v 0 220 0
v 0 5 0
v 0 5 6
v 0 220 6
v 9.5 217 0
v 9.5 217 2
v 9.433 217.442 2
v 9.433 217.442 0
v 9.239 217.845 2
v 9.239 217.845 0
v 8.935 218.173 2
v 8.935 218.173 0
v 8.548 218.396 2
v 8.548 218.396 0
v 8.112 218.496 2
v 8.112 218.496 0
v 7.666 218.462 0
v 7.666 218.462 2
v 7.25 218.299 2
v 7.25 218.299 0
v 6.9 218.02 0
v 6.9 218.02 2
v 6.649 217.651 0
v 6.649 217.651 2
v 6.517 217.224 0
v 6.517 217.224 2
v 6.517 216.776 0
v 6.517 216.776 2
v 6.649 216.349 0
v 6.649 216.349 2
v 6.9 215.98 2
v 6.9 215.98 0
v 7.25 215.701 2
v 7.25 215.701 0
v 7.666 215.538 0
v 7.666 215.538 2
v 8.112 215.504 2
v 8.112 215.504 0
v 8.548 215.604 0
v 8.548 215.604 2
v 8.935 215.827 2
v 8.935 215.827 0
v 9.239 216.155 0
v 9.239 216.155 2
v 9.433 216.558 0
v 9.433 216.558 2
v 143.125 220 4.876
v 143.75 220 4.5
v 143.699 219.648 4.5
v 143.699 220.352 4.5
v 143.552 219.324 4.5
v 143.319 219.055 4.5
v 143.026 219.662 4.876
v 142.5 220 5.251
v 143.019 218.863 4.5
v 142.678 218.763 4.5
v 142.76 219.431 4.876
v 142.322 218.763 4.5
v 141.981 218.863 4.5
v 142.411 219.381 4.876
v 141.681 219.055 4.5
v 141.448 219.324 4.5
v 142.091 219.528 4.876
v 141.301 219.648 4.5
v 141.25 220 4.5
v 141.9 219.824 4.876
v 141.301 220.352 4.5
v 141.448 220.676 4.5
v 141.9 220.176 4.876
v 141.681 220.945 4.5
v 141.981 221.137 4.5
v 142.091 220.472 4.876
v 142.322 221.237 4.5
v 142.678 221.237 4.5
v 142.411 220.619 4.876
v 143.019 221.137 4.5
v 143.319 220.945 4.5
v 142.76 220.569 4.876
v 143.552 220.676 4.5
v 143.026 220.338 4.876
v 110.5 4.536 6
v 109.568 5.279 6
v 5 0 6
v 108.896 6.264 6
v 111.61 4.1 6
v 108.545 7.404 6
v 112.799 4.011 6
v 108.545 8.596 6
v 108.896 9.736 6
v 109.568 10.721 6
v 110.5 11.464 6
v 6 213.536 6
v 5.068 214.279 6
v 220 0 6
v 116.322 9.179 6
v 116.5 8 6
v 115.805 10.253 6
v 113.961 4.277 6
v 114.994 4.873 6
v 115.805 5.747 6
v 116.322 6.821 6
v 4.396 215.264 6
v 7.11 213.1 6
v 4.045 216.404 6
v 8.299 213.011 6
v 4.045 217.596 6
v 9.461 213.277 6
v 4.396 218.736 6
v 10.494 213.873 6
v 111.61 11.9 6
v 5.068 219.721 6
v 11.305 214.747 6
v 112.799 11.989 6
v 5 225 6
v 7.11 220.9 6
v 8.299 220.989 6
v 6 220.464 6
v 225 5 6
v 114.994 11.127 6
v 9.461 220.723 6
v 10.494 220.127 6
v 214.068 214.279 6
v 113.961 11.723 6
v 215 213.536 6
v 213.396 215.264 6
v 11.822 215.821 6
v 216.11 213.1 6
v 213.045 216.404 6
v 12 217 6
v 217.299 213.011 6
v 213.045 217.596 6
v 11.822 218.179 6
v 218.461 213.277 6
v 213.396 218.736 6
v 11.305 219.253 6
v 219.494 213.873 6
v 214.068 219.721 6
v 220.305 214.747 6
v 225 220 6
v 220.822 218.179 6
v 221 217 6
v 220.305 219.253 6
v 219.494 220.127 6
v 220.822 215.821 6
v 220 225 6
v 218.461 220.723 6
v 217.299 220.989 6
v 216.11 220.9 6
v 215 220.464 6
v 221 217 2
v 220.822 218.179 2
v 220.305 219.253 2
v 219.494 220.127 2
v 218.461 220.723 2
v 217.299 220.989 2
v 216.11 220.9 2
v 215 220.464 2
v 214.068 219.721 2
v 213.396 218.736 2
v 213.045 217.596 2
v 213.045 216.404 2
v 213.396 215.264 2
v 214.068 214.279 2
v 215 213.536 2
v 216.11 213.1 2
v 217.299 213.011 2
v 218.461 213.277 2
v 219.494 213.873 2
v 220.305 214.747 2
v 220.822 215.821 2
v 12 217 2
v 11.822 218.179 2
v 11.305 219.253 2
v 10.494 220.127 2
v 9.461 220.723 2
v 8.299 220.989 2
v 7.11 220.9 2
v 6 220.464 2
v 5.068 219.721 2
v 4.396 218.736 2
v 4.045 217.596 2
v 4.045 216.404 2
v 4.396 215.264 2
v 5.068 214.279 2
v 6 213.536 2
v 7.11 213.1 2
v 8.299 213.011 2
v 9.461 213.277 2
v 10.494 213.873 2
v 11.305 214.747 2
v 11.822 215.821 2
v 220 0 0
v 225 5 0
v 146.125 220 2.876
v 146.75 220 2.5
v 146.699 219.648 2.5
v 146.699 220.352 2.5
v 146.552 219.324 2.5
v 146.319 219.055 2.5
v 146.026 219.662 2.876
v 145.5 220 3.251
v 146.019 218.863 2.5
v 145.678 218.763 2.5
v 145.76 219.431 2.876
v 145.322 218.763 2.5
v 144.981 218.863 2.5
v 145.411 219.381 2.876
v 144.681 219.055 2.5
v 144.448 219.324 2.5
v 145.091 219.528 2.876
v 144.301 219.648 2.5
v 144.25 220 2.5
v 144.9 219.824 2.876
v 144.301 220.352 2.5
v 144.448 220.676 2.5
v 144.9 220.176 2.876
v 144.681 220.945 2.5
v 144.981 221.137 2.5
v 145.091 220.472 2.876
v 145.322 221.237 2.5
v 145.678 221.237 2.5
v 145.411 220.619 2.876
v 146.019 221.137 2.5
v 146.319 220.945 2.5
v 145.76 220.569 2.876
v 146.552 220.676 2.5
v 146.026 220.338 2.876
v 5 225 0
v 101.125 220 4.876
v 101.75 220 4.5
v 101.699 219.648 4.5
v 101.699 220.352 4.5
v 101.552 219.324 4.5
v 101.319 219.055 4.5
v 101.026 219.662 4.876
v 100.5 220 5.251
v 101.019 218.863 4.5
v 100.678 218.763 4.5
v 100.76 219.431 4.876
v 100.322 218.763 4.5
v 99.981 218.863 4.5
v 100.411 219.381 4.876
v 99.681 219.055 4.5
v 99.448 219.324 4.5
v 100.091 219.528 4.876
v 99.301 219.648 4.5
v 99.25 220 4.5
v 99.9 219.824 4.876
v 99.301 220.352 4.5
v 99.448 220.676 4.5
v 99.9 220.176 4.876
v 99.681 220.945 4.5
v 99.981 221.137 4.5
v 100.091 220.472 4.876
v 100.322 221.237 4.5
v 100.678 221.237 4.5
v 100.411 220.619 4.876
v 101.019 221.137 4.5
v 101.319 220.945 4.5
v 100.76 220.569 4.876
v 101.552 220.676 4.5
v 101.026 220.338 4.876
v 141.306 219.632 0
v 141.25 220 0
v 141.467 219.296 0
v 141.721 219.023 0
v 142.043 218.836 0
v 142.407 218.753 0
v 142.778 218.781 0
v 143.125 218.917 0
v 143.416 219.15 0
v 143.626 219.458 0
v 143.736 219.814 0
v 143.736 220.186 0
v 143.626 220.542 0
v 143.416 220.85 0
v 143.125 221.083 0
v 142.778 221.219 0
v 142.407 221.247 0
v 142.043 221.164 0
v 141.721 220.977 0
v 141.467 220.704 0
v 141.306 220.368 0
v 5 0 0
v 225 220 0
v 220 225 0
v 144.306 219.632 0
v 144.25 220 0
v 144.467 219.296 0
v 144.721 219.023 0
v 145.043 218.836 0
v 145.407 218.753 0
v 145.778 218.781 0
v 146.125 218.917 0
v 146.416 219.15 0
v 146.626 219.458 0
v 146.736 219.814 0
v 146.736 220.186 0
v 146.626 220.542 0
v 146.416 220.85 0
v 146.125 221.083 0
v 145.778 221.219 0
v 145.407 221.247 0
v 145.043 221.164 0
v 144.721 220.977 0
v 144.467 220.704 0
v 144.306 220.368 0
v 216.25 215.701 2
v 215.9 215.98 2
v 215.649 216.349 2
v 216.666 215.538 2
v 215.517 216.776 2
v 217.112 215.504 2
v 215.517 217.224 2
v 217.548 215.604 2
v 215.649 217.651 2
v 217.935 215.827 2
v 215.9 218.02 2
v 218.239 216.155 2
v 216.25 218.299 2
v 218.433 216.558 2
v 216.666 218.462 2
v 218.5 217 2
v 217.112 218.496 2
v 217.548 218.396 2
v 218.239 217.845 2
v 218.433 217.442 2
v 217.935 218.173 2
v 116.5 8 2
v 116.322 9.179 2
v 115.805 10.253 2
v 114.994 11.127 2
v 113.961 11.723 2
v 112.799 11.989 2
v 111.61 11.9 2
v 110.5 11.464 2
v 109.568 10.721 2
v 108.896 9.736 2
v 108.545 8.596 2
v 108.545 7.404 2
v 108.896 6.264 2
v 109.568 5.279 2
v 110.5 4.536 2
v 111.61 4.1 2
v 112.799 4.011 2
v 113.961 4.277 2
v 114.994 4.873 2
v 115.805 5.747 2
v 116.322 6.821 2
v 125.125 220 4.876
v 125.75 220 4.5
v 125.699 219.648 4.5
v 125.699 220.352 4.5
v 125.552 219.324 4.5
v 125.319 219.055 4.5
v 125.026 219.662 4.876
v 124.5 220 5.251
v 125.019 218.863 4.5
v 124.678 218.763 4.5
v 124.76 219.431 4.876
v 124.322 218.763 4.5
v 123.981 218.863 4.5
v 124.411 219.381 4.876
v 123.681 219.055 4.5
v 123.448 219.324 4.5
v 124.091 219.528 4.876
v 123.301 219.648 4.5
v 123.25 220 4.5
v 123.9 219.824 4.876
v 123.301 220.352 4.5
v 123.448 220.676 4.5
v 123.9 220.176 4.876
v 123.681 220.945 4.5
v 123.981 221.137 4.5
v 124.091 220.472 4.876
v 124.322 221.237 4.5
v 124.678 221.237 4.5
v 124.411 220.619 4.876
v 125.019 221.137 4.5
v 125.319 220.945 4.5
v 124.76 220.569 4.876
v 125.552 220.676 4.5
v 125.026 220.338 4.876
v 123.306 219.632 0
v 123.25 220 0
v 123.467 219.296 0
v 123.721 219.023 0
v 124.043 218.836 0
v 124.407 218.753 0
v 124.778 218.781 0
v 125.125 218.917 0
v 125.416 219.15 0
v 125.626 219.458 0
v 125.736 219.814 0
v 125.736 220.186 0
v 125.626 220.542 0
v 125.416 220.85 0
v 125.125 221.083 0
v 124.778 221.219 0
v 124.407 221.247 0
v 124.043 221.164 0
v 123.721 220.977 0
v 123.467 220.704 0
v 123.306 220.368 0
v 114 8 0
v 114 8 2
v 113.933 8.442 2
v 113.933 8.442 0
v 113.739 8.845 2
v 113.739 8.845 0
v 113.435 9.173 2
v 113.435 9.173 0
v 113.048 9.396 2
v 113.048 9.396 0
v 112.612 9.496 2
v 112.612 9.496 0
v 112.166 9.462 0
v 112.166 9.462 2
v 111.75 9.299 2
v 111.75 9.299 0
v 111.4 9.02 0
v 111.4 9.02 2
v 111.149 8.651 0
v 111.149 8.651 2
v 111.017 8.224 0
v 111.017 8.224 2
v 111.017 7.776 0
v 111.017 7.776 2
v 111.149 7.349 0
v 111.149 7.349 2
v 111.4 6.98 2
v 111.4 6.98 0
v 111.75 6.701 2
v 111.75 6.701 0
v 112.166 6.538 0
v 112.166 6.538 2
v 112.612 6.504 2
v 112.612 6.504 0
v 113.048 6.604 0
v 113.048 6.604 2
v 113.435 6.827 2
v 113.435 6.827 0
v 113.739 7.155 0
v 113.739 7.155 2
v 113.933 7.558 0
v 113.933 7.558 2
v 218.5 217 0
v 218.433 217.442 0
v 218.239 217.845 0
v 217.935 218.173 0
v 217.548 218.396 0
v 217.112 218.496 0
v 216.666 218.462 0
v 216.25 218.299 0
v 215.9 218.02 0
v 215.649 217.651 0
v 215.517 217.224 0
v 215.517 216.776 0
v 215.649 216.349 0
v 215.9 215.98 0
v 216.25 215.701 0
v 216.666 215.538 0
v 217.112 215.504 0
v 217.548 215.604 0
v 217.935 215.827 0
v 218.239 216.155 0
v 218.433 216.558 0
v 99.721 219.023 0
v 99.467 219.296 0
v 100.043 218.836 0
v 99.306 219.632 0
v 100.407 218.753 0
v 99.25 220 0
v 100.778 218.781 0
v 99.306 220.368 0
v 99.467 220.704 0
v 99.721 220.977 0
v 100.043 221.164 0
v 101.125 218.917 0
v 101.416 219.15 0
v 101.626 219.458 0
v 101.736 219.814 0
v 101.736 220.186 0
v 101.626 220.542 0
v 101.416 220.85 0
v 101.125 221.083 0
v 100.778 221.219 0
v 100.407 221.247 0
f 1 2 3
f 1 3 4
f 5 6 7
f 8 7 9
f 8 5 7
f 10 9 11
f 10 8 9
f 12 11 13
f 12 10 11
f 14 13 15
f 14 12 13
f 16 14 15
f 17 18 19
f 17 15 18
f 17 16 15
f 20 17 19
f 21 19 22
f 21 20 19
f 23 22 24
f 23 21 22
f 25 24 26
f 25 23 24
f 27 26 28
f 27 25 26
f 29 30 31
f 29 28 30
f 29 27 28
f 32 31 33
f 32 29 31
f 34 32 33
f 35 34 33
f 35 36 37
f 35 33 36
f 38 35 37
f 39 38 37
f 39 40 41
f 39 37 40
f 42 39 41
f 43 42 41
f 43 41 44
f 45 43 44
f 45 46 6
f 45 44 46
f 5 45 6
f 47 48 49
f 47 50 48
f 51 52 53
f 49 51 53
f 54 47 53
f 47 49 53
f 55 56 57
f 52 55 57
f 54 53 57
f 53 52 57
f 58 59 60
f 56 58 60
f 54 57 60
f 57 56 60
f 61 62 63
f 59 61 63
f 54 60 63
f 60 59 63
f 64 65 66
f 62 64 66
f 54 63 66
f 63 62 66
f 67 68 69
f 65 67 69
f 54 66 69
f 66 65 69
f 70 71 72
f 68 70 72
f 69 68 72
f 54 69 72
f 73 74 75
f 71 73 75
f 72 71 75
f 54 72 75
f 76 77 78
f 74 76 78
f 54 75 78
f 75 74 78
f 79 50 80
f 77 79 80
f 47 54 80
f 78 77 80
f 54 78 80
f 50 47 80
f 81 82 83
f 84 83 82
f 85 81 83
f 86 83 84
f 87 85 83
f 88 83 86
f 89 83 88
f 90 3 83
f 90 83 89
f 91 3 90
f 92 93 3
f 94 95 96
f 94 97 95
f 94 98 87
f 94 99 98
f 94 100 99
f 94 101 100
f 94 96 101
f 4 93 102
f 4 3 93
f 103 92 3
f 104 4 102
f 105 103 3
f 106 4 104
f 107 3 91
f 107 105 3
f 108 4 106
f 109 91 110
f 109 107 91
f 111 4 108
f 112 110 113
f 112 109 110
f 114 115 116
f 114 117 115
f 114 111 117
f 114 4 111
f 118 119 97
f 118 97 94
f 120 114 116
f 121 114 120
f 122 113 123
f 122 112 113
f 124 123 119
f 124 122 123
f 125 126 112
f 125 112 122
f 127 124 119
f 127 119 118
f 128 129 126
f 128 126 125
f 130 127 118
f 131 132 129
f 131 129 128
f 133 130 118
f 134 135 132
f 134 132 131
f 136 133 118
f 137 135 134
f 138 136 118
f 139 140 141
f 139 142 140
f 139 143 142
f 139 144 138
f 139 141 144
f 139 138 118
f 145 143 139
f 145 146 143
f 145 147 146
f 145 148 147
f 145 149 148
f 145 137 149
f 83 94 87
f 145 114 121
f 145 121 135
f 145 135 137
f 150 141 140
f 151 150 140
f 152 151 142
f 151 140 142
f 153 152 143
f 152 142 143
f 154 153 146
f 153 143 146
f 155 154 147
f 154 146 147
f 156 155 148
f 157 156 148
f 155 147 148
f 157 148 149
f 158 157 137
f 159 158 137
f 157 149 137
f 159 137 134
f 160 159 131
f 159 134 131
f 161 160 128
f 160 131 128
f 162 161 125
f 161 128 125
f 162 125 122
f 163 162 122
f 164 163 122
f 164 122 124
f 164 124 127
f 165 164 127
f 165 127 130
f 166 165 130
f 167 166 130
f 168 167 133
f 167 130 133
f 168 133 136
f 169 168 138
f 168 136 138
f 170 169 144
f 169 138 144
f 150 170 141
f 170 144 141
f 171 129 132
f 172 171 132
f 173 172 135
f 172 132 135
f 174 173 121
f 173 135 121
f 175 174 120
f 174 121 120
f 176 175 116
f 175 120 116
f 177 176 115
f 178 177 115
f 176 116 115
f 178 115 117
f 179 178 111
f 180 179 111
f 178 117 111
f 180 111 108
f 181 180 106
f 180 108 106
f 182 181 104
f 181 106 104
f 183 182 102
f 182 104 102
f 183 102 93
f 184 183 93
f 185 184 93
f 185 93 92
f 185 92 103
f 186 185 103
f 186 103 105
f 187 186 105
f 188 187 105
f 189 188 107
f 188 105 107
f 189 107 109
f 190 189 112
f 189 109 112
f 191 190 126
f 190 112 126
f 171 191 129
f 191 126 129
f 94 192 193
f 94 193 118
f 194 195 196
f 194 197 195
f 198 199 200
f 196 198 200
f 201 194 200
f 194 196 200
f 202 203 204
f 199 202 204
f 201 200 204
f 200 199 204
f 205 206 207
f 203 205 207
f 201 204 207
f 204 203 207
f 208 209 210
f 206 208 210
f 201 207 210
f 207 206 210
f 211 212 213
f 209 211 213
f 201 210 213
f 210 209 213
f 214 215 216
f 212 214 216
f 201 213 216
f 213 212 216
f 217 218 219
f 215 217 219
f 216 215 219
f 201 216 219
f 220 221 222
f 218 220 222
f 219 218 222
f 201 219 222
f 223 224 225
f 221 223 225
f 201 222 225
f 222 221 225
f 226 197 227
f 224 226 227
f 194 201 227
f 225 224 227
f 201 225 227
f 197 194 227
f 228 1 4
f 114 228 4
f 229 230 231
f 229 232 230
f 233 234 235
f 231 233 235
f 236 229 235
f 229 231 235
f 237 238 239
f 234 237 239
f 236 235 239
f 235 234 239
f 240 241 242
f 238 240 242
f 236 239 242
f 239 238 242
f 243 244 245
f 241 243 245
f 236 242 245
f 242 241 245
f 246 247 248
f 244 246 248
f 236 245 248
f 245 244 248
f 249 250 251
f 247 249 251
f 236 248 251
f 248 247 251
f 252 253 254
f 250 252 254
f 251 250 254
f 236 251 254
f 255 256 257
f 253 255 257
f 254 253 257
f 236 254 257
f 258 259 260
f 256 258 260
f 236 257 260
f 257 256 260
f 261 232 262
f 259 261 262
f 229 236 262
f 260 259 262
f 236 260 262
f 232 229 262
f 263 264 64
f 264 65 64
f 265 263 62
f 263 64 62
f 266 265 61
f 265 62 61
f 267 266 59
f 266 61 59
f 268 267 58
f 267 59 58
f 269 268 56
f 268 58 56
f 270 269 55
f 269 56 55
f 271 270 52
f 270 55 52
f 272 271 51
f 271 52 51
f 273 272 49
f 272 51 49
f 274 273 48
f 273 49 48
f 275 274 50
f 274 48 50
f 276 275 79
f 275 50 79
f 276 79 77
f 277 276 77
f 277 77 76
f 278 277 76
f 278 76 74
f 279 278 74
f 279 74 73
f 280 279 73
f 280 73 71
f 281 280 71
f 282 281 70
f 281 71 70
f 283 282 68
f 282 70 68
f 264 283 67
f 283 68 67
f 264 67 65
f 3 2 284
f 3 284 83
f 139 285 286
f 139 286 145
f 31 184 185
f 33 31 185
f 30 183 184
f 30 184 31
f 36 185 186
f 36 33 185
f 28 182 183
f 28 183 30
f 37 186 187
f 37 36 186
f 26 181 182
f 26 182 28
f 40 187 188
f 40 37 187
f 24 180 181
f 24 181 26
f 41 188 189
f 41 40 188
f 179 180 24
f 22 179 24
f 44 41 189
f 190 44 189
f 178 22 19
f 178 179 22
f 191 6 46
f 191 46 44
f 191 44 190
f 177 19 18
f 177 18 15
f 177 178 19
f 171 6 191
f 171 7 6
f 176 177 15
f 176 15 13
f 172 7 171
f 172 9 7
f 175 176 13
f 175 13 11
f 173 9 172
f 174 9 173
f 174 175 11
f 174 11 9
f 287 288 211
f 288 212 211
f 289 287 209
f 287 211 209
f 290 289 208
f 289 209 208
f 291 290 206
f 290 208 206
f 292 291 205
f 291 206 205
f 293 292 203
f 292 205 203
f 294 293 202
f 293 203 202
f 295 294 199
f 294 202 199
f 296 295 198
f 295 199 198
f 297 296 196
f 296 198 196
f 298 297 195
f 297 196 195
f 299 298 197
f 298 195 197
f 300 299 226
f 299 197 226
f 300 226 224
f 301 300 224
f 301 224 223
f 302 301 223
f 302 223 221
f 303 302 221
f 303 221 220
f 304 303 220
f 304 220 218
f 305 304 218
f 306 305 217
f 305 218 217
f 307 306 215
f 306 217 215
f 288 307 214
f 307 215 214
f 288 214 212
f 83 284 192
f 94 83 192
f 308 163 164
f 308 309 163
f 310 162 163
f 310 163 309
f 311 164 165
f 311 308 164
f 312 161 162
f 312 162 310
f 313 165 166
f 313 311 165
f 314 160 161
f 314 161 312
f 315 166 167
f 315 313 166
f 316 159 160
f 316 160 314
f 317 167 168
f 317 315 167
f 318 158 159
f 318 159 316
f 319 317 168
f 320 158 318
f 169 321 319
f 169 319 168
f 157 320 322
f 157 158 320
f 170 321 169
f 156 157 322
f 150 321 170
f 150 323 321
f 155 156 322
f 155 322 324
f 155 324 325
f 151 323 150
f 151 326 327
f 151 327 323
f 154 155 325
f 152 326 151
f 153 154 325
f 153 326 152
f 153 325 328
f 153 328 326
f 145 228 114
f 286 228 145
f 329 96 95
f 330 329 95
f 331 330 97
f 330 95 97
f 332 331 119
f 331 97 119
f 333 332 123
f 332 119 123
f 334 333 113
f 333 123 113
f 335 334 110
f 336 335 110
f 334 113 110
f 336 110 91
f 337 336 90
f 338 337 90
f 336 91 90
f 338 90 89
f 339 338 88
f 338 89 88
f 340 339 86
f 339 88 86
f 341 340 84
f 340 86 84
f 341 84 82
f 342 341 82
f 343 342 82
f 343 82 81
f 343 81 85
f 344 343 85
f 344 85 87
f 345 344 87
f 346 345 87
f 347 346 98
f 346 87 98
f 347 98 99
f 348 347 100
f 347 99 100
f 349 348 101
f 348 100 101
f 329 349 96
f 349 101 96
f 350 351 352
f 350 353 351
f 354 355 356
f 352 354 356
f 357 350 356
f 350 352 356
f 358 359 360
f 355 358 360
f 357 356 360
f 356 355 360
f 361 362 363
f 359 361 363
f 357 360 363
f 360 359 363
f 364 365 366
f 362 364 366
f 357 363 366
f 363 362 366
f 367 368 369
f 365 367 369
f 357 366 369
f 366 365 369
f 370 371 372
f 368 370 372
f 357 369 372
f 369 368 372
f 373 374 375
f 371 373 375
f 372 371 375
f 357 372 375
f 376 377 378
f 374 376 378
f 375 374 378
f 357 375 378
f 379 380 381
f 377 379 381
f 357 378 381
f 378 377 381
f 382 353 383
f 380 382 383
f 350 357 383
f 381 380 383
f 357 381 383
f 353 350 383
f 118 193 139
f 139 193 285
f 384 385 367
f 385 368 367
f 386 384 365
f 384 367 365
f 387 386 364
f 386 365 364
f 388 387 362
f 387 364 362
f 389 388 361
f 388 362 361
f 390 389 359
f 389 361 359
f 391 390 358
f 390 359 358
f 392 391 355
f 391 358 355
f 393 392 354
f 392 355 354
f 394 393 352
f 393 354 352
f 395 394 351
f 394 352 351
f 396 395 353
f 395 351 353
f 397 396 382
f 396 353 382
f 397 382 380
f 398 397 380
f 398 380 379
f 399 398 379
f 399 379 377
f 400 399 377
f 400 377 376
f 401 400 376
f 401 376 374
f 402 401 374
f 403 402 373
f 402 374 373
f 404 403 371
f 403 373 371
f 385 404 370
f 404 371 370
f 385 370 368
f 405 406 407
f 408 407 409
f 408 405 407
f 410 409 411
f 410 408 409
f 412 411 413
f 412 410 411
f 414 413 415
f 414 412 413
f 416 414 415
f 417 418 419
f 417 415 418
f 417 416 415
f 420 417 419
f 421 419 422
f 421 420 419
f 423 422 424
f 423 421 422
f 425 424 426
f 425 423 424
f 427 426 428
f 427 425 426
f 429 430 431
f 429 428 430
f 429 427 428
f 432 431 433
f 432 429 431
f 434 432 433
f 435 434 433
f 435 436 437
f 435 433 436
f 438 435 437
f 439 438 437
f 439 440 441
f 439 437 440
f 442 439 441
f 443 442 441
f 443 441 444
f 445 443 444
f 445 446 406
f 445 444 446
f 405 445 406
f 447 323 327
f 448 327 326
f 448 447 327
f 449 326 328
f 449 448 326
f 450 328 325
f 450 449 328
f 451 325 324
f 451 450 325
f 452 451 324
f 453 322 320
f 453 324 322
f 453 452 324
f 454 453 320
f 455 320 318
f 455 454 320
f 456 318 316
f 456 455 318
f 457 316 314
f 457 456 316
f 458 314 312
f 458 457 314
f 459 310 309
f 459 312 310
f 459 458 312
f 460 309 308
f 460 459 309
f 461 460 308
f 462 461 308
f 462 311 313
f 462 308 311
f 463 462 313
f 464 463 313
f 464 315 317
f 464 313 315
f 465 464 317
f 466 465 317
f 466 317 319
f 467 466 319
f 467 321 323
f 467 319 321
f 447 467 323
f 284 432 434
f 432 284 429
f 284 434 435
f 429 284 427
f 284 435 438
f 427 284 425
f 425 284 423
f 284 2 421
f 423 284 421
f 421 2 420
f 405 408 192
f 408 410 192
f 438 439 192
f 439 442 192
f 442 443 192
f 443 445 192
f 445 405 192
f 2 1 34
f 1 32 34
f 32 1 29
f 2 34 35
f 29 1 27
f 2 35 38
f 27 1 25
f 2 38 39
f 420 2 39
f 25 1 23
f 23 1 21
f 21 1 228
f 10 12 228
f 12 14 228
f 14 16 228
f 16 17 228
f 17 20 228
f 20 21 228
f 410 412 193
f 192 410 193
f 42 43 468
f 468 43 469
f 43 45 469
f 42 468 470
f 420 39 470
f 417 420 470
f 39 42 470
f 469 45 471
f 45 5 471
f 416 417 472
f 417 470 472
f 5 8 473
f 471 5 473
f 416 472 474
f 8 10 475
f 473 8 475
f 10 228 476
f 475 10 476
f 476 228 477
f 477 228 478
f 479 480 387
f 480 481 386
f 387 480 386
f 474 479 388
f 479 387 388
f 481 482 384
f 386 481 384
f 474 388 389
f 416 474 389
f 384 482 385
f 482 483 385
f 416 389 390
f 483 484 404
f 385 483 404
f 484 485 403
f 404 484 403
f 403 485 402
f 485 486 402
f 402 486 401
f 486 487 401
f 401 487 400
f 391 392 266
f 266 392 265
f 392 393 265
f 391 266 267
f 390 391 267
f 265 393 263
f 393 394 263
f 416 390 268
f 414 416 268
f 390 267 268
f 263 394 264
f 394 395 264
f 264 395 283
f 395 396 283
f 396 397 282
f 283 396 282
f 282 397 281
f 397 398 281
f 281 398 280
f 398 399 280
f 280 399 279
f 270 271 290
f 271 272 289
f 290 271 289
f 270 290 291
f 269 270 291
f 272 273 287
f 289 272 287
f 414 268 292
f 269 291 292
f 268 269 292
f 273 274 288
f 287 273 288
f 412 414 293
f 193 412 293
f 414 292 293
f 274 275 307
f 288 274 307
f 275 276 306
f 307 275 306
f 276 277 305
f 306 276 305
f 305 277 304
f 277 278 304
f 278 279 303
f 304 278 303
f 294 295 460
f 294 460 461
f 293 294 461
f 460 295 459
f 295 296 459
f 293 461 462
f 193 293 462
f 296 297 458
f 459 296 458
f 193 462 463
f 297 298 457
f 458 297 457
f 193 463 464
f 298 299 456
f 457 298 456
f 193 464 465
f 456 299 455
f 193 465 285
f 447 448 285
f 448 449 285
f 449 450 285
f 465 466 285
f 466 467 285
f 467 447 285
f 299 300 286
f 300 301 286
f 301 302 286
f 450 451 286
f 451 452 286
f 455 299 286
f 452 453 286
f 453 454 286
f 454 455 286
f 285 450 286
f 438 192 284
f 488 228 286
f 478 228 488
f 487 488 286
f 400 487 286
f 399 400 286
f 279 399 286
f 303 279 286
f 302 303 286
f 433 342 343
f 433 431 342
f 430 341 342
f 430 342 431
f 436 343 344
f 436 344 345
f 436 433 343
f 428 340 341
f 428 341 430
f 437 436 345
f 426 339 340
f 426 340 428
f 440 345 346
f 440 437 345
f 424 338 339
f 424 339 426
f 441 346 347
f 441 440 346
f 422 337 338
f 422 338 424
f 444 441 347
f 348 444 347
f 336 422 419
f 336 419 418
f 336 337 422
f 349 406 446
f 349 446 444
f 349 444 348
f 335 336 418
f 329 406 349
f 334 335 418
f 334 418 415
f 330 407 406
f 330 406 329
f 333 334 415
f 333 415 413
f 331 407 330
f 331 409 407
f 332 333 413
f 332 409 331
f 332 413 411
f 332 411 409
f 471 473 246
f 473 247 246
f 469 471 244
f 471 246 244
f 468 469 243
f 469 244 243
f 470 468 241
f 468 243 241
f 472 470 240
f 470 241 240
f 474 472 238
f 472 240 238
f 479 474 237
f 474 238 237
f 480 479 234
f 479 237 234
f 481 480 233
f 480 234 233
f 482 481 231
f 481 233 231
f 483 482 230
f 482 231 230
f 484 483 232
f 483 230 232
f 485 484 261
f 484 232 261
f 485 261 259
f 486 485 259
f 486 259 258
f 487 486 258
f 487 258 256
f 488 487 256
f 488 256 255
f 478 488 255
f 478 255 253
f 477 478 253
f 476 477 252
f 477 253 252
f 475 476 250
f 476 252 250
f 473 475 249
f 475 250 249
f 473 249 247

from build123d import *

# Parameters (mm, degrees)
F0_W     = 225
F0_H     = 225
F0_R     = 1.5
F1_DEPTH = 6
F2_R     = 4
F3_DEPTH = 4
F4_SIZE  = 5
F6_D     = 2.5
F6_DEPTH = 4.5
F6_TIP   = 0.7510757738
F7_D     = 2.5
F7_DEPTH = 2.5
F7_TIP   = 0.7510757738


with BuildPart() as f1:
    # F0 (on Top) → F1 (new body)
    with BuildSketch(Plane.XY):
        with Locations((112.5, 112.5)):
            Rectangle(F0_W, F0_H)
        with Locations((112.5, 8)):
            Circle(F0_R, mode=Mode.SUBTRACT)
        with Locations((8, 217)):
            Circle(F0_R, mode=Mode.SUBTRACT)
        with Locations((217, 217)):
            Circle(F0_R, mode=Mode.SUBTRACT)
    extrude(amount=F1_DEPTH)

    # F2 (on face) → F3 (cut)
    with BuildSketch(Plane.XY.offset(6)):
        with Locations((112.5, 8)):
            Circle(F2_R)
        with Locations((8, 217)):
            Circle(F2_R)
        with Locations((217, 217)):
            Circle(F2_R)
    extrude(amount=-F3_DEPTH, mode=Mode.SUBTRACT)

    # F4
    f4_edges = [f1.edges().sort_by_distance(p)[0] for p in [
        (225, 0, 3),
        (0, 0, 3),
        (225, 225, 3),
        (0, 225, 3),
    ]]
    chamfer(f4_edges, length=F4_SIZE)

    # F6
    with Locations(Plane(origin=(0, 0, 0), x_dir=(1, 0, 0), z_dir=(0, 0, -1))):
        with Locations((100.5, -220), (124.5, -220), (142.5, -220)):
            Hole(F6_D / 2, depth=F6_DEPTH)
            with Locations((0, 0, -(F6_DEPTH + F6_TIP / 2))):  # 118° drill point
                Cone(0, F6_D / 2, F6_TIP, mode=Mode.SUBTRACT)

    # F7
    with Locations(Plane(origin=(0, 0, 0), x_dir=(1, 0, 0), z_dir=(0, 0, -1))):
        with Locations((145.5, -220)):
            Hole(F7_D / 2, depth=F7_DEPTH)
            with Locations((0, 0, -(F7_DEPTH + F7_TIP / 2))):  # 118° drill point
                Cone(0, F7_D / 2, F7_TIP, mode=Mode.SUBTRACT)


solid = f1.part
